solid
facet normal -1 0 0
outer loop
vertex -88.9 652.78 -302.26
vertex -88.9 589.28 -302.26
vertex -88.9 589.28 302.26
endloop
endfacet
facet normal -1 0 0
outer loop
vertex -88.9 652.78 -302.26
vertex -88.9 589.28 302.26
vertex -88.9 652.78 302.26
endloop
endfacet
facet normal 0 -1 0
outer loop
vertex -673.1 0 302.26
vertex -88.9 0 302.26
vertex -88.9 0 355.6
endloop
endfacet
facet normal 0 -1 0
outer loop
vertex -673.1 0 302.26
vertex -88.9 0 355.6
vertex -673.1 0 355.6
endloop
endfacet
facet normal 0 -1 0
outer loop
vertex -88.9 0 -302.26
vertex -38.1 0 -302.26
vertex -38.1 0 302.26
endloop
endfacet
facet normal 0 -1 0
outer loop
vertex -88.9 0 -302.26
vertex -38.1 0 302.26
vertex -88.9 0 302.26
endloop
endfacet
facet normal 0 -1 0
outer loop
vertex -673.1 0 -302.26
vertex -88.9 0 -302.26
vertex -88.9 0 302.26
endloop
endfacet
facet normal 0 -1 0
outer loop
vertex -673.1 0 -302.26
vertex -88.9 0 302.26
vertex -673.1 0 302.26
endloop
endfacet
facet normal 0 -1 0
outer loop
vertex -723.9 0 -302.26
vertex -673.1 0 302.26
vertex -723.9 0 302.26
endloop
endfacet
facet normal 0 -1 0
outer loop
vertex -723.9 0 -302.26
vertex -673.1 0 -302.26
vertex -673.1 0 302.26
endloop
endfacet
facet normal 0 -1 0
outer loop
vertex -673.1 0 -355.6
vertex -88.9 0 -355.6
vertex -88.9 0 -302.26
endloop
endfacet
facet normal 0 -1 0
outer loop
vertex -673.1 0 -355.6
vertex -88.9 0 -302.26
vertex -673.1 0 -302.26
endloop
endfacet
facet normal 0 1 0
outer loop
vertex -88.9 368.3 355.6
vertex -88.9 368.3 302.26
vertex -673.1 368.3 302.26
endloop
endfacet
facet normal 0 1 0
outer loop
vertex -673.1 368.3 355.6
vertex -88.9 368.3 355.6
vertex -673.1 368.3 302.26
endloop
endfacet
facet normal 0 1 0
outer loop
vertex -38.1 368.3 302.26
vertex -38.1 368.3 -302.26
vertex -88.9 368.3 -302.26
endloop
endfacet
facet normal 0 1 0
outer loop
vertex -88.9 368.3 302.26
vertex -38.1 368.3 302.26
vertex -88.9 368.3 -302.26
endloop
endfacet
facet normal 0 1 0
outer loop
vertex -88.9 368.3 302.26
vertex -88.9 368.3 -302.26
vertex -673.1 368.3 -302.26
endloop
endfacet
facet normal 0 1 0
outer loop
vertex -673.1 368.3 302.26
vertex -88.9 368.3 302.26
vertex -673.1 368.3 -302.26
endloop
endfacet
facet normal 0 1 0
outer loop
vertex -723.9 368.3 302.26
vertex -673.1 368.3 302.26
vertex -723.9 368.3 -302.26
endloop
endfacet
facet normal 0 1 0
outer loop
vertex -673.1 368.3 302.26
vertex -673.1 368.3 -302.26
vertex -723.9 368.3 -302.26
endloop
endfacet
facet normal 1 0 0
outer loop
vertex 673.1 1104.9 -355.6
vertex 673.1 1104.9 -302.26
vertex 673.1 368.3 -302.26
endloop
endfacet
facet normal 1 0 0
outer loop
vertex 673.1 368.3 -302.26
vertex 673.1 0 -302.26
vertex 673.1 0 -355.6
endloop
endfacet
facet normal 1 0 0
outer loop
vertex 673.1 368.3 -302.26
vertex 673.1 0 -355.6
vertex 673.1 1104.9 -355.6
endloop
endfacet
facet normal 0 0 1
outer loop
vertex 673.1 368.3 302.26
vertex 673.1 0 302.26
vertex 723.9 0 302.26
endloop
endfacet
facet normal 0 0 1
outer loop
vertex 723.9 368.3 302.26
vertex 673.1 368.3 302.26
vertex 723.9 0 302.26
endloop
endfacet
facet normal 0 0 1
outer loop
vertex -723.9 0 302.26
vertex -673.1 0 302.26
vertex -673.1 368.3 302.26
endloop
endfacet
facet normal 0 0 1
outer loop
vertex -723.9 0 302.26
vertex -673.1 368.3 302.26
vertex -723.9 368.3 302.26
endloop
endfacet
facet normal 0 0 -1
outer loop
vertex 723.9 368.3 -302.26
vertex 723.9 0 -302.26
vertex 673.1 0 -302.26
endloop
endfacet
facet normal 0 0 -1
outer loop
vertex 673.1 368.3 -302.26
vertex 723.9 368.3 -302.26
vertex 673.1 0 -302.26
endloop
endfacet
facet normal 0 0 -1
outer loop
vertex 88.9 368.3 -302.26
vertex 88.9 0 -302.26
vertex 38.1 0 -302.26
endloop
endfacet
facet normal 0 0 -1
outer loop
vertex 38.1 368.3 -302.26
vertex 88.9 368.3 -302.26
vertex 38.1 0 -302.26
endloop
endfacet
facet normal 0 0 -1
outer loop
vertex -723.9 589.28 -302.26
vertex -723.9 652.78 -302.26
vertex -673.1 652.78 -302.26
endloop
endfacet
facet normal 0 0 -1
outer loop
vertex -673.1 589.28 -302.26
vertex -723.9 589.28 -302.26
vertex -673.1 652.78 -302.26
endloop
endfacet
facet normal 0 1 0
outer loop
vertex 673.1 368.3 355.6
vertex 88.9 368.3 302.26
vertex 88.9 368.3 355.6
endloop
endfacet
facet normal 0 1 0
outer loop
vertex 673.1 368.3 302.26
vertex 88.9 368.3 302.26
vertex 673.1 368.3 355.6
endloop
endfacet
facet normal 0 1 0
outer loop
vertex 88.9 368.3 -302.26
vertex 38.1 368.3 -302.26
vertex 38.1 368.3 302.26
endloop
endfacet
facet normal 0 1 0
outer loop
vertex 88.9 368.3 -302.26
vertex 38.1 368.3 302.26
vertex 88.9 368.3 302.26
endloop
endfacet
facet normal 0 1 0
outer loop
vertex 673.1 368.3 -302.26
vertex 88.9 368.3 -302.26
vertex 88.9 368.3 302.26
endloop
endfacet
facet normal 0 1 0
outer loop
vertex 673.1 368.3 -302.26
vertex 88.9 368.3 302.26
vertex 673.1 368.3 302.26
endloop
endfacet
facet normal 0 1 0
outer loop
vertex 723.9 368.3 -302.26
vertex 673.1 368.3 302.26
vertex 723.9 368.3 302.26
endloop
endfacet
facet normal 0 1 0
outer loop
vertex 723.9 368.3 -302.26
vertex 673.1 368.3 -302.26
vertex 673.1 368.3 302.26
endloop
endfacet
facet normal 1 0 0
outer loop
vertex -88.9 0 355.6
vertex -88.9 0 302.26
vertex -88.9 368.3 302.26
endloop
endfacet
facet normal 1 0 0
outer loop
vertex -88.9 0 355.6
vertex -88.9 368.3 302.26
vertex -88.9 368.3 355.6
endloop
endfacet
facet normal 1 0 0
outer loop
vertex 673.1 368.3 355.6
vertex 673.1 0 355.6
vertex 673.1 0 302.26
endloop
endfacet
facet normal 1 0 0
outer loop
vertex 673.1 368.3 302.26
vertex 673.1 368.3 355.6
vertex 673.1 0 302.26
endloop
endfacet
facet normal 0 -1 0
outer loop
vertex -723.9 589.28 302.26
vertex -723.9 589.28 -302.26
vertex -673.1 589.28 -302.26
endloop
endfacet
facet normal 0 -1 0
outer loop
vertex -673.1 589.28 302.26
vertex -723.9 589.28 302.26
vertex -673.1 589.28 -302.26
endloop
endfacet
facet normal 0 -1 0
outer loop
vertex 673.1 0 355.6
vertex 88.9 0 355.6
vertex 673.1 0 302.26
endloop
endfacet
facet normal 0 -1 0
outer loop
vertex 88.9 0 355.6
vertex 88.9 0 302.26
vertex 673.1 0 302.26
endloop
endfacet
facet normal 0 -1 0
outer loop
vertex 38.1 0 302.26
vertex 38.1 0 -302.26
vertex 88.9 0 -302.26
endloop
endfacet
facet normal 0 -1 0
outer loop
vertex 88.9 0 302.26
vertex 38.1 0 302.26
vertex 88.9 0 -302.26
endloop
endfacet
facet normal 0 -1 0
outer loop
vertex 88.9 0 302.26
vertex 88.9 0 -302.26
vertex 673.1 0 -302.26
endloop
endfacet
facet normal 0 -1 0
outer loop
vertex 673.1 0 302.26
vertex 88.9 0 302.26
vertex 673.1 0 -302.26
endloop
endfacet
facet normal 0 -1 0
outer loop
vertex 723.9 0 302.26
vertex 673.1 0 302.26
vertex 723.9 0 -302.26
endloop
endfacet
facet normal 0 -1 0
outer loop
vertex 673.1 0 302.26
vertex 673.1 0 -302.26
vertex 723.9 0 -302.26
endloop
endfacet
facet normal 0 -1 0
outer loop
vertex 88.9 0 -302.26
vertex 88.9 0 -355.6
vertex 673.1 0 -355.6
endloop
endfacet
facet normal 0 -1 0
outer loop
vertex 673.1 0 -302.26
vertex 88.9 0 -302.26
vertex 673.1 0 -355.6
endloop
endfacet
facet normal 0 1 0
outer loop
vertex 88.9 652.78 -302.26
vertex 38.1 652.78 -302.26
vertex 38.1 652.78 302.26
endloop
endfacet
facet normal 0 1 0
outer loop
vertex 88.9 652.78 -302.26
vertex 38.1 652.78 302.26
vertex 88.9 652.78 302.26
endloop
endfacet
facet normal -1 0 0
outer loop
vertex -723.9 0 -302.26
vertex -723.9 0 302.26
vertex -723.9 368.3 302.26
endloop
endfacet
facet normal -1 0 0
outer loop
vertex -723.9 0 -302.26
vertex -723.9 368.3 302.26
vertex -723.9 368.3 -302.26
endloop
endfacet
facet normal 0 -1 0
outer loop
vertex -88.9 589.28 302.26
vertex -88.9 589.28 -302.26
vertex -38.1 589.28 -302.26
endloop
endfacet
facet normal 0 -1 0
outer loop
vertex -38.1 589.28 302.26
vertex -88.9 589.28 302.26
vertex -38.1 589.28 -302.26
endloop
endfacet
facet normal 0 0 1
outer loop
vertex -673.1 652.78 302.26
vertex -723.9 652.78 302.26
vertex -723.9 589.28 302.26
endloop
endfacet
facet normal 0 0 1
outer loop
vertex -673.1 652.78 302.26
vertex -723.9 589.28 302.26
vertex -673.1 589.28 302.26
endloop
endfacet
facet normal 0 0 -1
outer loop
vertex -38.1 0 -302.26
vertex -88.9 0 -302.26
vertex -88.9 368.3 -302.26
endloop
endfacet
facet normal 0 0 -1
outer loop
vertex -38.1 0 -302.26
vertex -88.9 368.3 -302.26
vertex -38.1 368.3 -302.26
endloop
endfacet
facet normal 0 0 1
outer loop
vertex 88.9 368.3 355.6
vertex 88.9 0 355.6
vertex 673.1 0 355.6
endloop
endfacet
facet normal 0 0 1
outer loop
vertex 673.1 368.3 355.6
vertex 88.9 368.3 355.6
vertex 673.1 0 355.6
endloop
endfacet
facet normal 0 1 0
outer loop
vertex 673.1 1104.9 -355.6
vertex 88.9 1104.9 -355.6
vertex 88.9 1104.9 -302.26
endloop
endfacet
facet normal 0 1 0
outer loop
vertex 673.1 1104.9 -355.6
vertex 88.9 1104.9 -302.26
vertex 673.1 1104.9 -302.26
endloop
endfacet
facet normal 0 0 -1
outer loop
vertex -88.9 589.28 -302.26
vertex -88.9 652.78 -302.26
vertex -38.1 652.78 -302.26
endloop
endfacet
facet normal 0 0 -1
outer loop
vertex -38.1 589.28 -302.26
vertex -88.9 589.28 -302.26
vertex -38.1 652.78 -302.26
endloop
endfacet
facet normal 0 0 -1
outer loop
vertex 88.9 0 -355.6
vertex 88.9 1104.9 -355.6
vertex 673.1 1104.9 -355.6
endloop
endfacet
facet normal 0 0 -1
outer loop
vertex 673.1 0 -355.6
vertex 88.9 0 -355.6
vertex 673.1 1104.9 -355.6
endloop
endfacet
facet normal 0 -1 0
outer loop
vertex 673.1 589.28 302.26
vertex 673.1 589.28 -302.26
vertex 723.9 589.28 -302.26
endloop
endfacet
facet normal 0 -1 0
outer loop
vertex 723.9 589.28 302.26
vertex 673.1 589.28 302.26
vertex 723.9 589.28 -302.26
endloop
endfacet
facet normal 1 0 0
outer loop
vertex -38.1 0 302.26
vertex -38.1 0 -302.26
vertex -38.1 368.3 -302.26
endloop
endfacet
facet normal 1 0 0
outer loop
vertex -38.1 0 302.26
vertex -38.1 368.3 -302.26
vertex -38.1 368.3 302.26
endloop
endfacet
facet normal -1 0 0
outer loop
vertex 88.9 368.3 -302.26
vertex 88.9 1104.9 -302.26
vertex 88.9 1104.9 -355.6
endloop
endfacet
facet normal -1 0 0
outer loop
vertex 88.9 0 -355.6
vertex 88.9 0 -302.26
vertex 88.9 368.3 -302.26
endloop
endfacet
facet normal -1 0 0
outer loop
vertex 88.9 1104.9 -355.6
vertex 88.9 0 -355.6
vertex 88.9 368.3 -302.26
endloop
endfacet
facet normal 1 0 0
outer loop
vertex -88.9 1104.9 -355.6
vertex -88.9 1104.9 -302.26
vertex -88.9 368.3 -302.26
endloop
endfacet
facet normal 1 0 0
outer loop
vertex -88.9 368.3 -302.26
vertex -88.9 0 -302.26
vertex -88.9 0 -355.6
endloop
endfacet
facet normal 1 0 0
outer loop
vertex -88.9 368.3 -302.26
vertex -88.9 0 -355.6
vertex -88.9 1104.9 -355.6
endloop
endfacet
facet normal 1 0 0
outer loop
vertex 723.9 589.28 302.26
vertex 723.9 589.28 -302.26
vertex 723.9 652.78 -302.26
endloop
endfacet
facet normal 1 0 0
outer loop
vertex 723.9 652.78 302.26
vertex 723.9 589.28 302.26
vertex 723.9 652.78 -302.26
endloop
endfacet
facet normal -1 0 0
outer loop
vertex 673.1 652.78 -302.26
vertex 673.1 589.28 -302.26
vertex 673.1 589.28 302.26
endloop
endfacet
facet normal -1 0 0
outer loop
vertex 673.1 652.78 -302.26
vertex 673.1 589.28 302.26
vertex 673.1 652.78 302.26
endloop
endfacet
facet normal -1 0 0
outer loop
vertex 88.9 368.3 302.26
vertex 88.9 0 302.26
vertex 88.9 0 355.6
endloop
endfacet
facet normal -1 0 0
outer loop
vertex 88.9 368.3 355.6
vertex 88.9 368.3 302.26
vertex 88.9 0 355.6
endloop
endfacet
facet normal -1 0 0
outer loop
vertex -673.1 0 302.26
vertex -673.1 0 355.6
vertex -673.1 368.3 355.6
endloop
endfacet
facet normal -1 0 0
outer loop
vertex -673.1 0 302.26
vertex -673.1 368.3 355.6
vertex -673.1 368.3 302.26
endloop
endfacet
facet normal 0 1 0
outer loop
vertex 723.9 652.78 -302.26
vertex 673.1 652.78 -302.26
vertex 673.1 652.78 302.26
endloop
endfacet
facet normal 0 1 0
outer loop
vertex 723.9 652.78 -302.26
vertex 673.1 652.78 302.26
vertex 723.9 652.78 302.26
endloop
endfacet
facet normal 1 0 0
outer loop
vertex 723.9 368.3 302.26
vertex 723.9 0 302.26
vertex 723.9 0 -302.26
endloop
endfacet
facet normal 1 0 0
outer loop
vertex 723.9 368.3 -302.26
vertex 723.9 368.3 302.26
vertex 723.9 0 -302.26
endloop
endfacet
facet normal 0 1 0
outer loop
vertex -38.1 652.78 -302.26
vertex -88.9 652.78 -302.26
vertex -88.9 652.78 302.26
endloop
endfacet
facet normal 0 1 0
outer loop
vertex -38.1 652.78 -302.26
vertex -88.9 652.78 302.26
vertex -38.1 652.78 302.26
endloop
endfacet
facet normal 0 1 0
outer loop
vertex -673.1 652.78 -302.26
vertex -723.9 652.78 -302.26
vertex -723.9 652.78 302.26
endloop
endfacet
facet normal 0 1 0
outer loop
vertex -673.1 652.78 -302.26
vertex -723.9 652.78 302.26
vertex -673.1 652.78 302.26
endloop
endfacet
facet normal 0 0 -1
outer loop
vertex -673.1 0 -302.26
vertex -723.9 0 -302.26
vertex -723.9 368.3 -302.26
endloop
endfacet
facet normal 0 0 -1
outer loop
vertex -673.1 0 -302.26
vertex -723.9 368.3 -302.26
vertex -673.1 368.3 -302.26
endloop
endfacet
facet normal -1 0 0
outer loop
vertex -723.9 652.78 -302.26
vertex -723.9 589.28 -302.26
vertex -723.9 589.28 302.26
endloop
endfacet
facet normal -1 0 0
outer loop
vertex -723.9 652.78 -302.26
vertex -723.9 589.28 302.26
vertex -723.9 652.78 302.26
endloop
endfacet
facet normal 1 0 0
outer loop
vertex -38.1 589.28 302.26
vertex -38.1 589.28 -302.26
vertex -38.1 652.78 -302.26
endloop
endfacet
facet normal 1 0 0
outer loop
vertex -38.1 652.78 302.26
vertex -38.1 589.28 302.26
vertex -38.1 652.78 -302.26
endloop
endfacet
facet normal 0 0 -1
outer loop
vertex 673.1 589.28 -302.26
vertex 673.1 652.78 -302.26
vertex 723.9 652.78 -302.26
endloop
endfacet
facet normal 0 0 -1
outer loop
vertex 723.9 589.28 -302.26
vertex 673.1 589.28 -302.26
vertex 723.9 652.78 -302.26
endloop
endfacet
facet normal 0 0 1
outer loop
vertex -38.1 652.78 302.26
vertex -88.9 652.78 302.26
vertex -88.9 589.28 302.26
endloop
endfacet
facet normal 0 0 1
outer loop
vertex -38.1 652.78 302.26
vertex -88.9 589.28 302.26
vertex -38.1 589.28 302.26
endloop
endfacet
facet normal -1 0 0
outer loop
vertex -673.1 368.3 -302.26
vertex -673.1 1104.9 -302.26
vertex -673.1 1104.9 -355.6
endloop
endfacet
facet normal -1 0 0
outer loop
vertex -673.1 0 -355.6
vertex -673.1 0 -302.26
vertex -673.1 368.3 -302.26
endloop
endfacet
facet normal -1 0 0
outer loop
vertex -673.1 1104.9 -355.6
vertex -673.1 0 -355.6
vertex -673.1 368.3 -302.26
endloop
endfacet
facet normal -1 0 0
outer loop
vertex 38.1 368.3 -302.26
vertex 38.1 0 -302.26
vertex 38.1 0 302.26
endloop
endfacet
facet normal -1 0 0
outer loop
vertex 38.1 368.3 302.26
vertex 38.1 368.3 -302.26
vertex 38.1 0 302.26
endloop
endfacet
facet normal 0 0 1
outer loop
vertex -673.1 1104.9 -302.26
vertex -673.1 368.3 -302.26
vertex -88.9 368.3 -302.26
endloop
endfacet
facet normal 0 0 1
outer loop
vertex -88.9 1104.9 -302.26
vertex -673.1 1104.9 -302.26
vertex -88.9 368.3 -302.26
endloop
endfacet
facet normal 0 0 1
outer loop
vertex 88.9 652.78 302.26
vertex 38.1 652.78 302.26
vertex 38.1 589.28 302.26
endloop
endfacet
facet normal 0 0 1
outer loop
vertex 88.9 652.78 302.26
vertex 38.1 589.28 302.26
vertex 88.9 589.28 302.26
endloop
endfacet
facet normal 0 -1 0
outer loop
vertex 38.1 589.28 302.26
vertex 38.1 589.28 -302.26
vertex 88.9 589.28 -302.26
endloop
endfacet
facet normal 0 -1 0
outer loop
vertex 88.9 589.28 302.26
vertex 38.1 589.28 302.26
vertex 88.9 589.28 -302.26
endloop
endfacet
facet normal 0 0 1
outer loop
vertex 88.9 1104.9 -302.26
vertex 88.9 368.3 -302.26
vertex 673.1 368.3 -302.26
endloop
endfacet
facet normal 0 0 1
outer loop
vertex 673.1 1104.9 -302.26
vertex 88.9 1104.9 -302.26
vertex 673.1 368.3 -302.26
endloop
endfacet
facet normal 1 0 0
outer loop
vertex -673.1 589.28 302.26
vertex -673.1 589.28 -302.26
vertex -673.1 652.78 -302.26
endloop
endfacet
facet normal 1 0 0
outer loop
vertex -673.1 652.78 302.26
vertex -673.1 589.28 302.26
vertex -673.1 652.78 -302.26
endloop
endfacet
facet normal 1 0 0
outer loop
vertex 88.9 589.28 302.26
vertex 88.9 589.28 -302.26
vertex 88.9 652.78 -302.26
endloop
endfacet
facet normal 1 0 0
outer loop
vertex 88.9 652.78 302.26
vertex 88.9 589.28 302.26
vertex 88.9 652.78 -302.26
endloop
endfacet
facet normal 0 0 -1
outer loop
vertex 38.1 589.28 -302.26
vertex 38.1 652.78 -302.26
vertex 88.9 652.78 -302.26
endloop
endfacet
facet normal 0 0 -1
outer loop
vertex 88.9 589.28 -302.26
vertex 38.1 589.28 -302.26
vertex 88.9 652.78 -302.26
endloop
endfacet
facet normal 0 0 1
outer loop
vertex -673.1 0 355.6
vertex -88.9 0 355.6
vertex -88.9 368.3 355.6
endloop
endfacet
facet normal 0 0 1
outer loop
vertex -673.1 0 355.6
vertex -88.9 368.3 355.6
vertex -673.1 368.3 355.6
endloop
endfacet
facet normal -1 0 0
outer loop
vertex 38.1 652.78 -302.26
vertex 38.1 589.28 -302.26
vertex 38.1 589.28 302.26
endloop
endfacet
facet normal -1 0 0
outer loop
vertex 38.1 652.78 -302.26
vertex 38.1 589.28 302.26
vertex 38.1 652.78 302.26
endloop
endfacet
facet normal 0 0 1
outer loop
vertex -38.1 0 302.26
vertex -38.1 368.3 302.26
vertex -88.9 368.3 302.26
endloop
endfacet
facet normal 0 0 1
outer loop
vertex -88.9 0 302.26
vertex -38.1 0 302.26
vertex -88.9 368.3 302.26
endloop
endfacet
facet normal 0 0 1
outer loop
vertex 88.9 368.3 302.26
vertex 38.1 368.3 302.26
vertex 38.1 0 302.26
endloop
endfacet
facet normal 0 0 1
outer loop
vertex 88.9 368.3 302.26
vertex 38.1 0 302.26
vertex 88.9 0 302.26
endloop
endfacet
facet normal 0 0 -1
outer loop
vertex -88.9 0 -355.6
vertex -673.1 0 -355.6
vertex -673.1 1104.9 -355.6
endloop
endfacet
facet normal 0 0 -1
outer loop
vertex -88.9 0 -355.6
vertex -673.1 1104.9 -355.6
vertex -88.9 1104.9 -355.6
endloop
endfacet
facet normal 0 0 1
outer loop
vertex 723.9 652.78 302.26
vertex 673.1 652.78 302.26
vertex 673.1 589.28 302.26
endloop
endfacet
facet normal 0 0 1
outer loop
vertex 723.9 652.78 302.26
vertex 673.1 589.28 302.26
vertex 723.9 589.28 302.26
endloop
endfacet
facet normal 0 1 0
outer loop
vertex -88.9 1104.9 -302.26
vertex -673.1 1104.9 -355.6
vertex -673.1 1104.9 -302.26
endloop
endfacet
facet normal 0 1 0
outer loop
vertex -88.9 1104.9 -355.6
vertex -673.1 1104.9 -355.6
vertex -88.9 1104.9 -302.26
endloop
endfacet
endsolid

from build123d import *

# Parameters (mm, degrees)
BOSS_EXTRUDE1_DEPTH   = 368.3
BOSS_EXTRUDE1_2_DEPTH = 368.3
SKETCH2_W             = 584.2
SKETCH2_H             = 53.34
BOSS_EXTRUDE2_DEPTH   = 736.6
SKETCH3_W             = 50.8
SKETCH3_H             = 63.5
BOSS_EXTRUDE3_DEPTH   = 604.52
BOSS_EXTRUDE3_2_DEPTH = 604.52
BOSS_EXTRUDE3_3_DEPTH = 604.52
BOSS_EXTRUDE3_4_DEPTH = 604.52


with BuildPart() as part:
    # Sketch1 → Boss-Extrude1 (new body)
    with BuildSketch(Plane(origin=(0, 0, 0), x_dir=(1, 0, 0), z_dir=(0, 1, 0))):
        Polygon((-723.9, 302.26), (-673.1, 302.26), (-673.1, 355.6), (-88.9, 355.6), (-88.9, 302.26), (-38.1, 302.26), (-38.1, -302.26), (-88.9, -302.26), (-88.9, -355.6), (-673.1, -355.6), (-673.1, -302.26), (-723.9, -302.26), align=None)
    extrude(amount=BOSS_EXTRUDE1_DEPTH)



with BuildPart() as body_2:
    # Sketch1 → Boss-Extrude1 2 (new body)
    with BuildSketch(Plane(origin=(0, 0, 0), x_dir=(1, 0, 0), z_dir=(0, 1, 0))):
        Polygon((88.9, -355.6), (673.1, -355.6), (673.1, -302.26), (723.9, -302.26), (723.9, 302.26), (673.1, 302.26), (673.1, 355.6), (88.9, 355.6), (88.9, 302.26), (38.1, 302.26), (38.1, -302.26), (88.9, -302.26), align=None)
    extrude(amount=BOSS_EXTRUDE1_2_DEPTH)


with BuildPart() as part_1:
    add(part.part)

    add(body_2.part)  # Boss-Extrude2 merges body 2
    # Sketch2 → Boss-Extrude2 (add)
    with BuildSketch(Plane(origin=(0, 368.3, 0), x_dir=(1, 0, 0), z_dir=(0, 1, 0))):
        with Locations((-381, 328.93)):
            Rectangle(SKETCH2_W, SKETCH2_H)
        with Locations((381, 328.93)):
            Rectangle(SKETCH2_W, SKETCH2_H)
    extrude(amount=BOSS_EXTRUDE2_DEPTH)


with BuildPart() as body_2_2:
    # Sketch3 → Boss-Extrude3 (new body)
    with BuildSketch(Plane.XY.offset(-302.26)):
        with Locations((-698.5, 621.03)):
            Rectangle(SKETCH3_W, SKETCH3_H)
    extrude(amount=BOSS_EXTRUDE3_DEPTH)


with BuildPart() as body_3:
    # Sketch3 → Boss-Extrude3 2 (new body)
    with BuildSketch(Plane.XY.offset(-302.26)):
        with Locations((698.5, 621.03)):
            Rectangle(SKETCH3_W, SKETCH3_H)
    extrude(amount=BOSS_EXTRUDE3_2_DEPTH)


with BuildPart() as body_4:
    # Sketch3 → Boss-Extrude3 3 (new body)
    with BuildSketch(Plane.XY.offset(-302.26)):
        with Locations((-63.5, 621.03)):
            Rectangle(SKETCH3_W, SKETCH3_H)
    extrude(amount=BOSS_EXTRUDE3_3_DEPTH)


with BuildPart() as body_5:
    # Sketch3 → Boss-Extrude3 4 (new body)
    with BuildSketch(Plane.XY.offset(-302.26)):
        with Locations((63.5, 621.03)):
            Rectangle(SKETCH3_W, SKETCH3_H)
    extrude(amount=BOSS_EXTRUDE3_4_DEPTH)


solid = Compound([part_1.part, body_2_2.part, body_3.part, body_4.part, body_5.part])
